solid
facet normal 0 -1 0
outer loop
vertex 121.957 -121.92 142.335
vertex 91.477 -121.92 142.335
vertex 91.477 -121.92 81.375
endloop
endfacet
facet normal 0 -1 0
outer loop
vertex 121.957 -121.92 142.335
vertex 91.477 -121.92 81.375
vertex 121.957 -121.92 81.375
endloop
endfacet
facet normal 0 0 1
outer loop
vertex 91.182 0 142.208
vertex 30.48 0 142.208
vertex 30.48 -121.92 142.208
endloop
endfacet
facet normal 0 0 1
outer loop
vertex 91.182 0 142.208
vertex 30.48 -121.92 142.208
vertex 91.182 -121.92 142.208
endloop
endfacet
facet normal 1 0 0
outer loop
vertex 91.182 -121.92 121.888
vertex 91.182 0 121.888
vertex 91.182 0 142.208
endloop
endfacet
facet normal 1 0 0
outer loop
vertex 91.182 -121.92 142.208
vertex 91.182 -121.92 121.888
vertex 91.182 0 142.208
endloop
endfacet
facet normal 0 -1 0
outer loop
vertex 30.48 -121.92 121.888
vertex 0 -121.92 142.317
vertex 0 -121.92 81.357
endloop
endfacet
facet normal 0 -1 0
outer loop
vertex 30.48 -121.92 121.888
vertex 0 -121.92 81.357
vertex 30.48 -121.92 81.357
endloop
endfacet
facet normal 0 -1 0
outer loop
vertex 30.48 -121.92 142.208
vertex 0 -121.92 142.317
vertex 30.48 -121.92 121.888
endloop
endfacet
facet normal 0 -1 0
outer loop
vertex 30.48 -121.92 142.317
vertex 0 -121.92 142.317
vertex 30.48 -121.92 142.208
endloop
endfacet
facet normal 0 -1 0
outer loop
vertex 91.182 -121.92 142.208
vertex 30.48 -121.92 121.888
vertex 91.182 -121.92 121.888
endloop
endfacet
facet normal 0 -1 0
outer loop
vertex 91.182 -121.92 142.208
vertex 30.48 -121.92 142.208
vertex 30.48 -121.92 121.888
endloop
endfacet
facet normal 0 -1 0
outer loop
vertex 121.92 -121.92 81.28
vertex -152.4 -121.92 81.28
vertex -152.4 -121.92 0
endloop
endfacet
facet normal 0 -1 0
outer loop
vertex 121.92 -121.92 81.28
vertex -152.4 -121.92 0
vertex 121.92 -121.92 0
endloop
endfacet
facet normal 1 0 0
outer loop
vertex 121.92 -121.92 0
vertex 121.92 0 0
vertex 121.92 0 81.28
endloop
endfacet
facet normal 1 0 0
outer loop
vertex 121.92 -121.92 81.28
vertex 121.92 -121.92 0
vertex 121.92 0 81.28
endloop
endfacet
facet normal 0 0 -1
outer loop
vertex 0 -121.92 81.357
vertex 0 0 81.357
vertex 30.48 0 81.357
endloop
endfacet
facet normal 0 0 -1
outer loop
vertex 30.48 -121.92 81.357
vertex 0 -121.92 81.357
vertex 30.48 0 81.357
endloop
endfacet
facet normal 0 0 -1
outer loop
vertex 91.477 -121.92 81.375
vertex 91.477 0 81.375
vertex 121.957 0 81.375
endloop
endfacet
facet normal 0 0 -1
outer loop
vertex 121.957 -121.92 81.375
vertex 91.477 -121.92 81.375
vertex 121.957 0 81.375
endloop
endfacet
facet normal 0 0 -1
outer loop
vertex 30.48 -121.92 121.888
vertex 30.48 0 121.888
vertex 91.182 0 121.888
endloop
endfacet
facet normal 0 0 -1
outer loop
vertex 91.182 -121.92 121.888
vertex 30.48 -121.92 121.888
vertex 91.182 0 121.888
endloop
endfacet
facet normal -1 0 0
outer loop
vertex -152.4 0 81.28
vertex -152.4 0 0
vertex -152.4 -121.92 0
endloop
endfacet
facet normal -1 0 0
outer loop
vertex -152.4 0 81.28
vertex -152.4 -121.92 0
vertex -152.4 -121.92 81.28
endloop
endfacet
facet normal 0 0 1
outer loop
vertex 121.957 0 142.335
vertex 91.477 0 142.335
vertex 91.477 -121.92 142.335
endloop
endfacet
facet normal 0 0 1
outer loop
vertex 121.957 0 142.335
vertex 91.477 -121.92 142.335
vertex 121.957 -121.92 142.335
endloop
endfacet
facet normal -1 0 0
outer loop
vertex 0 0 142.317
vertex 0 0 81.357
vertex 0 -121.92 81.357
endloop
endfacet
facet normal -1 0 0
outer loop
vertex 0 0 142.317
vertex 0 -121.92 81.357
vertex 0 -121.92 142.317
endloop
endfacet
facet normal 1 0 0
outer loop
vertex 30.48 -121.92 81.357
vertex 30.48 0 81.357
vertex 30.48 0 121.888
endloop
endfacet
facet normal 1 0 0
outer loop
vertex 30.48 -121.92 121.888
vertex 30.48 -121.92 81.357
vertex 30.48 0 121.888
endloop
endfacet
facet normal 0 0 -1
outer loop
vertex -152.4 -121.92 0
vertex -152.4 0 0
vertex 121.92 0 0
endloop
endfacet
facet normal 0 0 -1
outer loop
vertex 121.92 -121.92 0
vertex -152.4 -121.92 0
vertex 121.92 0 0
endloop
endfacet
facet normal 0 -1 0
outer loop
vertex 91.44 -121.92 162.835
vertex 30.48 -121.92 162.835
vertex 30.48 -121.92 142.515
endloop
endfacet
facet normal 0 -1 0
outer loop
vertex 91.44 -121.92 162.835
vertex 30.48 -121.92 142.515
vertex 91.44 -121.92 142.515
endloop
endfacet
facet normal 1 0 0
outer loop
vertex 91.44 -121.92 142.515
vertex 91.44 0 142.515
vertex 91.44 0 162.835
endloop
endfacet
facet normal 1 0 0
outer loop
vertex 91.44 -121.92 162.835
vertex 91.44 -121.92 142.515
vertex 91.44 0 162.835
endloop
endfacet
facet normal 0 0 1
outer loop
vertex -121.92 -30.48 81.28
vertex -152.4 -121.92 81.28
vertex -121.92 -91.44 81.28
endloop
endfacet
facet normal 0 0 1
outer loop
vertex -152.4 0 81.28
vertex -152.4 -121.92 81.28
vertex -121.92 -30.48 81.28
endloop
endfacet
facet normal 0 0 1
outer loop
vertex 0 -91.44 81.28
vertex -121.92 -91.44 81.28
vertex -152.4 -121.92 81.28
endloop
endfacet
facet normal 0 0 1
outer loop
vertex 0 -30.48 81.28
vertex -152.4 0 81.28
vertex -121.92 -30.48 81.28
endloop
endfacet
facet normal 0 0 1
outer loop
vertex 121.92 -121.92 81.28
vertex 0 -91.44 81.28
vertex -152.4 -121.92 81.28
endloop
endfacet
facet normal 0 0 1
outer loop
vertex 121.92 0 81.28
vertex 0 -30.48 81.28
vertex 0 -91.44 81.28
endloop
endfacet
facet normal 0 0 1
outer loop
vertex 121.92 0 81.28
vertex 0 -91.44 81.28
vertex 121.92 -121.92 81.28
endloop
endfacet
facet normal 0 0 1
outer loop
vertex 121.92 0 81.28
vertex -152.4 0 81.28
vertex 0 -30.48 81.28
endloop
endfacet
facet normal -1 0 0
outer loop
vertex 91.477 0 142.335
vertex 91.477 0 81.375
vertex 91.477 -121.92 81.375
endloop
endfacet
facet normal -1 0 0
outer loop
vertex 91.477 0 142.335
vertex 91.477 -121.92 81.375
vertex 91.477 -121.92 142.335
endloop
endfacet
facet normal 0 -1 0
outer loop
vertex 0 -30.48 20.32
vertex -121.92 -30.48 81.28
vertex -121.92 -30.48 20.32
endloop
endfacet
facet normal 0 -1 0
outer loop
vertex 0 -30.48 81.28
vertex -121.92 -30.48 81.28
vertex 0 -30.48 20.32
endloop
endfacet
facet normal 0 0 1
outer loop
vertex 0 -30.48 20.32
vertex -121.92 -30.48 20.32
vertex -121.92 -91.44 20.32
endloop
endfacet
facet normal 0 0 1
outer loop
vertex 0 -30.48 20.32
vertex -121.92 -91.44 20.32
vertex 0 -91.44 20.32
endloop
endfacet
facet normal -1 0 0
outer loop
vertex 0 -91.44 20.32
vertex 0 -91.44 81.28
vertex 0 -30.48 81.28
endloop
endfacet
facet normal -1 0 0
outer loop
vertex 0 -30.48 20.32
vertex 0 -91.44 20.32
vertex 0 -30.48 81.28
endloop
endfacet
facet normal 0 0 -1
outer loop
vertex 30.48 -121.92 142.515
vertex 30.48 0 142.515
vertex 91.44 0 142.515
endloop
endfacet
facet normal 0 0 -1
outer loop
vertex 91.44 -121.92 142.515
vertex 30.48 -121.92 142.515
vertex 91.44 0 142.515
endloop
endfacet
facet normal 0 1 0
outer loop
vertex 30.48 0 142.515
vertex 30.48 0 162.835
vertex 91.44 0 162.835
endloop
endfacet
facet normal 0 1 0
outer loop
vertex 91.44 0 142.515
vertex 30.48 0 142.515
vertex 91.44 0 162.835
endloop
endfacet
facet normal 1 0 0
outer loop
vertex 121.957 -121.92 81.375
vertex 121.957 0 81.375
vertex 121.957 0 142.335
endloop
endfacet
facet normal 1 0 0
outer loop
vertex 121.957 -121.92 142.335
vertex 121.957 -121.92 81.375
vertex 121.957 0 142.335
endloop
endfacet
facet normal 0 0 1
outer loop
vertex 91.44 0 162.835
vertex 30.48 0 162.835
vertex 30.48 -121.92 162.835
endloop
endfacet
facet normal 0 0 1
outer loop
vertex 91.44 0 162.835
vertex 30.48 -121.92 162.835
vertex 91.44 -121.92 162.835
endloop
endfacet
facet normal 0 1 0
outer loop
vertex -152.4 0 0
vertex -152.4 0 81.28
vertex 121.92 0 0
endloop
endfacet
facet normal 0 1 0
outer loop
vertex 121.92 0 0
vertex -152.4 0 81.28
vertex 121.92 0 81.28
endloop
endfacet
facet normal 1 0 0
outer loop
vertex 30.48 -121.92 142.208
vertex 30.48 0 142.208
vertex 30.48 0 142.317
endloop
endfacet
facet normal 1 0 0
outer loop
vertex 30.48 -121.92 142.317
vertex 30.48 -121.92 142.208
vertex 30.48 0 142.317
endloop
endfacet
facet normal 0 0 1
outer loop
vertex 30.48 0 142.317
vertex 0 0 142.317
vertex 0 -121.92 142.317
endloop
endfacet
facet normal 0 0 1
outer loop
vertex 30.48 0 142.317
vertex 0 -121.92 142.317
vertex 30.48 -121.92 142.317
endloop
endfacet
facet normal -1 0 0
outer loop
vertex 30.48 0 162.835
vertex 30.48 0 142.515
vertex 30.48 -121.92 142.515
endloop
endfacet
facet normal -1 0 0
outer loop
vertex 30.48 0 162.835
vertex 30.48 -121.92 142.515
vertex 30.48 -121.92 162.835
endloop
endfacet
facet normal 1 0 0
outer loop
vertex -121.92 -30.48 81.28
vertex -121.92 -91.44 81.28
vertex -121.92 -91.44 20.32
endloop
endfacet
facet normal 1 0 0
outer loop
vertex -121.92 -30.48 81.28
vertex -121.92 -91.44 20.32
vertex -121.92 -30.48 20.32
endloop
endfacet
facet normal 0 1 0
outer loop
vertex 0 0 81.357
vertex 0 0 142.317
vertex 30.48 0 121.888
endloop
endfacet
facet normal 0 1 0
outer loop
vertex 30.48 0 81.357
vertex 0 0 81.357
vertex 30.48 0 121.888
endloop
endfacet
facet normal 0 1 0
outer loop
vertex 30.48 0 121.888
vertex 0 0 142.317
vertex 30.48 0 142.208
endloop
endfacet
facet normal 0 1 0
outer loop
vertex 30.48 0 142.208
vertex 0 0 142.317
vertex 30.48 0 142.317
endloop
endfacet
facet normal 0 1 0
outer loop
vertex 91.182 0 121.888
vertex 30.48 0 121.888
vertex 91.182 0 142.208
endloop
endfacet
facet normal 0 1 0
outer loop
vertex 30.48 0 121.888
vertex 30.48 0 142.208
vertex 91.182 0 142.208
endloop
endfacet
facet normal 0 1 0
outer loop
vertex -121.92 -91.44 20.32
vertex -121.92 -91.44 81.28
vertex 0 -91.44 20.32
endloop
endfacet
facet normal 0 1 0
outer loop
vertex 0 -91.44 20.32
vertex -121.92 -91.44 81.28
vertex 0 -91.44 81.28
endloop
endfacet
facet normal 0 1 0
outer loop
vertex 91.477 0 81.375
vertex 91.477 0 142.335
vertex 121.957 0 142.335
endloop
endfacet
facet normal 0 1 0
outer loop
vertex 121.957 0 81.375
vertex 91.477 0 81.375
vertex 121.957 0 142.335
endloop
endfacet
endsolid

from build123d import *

# Parameters (mm, degrees)
F0_W      = 121.92
F0_H      = 81.28
F1_DEPTH  = 121.92
F2_W      = 30.48
F2_H      = 60.96
F3_DEPTH  = 121.92
F5_W      = 60.96
F5_H      = 20.32
F4_W      = 30.48
F4_H      = 60.96
F6_DEPTH  = 121.92
F7_W      = 60.96
F7_H      = 20.32
F8_DEPTH  = 121.92
F9_W      = 152.4
F9_H      = 81.28
F10_DEPTH = 121.92
F11_W     = 121.92
F11_H     = 60.96
F12_DEPTH = 60.96


with BuildPart() as f1:
    # F0 (on Front) → F1 (new body)
    with BuildSketch(Plane.XZ):
        with Locations((60.96, 40.64)):
            Rectangle(F0_W, F0_H)
    extrude(amount=F1_DEPTH)

    # F9 (on Front) → F10 (join)
    with BuildSketch(Plane.XZ):
        with Locations((-76.2, 40.64)):
            Rectangle(F9_W, F9_H)
    extrude(amount=F10_DEPTH)

    # F11 (on face) → F12 (cut)
    with BuildSketch(Plane.XY.offset(81.28)):
        with Locations((-60.96, -60.96)):
            Rectangle(F11_W, F11_H)
    extrude(amount=-F12_DEPTH, mode=Mode.SUBTRACT)


with BuildPart() as f3:
    # F2 (on Front) → F3 (new body)
    with BuildSketch(Plane.XZ):
        with Locations((15.24, 111.837151)):
            Rectangle(F2_W, F2_H)
    extrude(amount=F3_DEPTH)

    # F5 (on Front) + F4 (on Front) → F6 (join)
    with BuildSketch(Plane.XZ):
        with Locations((60.701704, 132.047918)):
            Rectangle(F5_W, F5_H)
    with BuildSketch(Plane.XZ):
        with Locations((106.717089, 111.855353)):
            Rectangle(F4_W, F4_H)
    extrude(amount=F6_DEPTH)


with BuildPart() as f8:
    # F7 (on Front) → F8 (new body)
    with BuildSketch(Plane.XZ):
        with Locations((60.96, 152.674706)):
            Rectangle(F7_W, F7_H)
    extrude(amount=F8_DEPTH)


solid = Compound([f1.part, f3.part, f8.part])
